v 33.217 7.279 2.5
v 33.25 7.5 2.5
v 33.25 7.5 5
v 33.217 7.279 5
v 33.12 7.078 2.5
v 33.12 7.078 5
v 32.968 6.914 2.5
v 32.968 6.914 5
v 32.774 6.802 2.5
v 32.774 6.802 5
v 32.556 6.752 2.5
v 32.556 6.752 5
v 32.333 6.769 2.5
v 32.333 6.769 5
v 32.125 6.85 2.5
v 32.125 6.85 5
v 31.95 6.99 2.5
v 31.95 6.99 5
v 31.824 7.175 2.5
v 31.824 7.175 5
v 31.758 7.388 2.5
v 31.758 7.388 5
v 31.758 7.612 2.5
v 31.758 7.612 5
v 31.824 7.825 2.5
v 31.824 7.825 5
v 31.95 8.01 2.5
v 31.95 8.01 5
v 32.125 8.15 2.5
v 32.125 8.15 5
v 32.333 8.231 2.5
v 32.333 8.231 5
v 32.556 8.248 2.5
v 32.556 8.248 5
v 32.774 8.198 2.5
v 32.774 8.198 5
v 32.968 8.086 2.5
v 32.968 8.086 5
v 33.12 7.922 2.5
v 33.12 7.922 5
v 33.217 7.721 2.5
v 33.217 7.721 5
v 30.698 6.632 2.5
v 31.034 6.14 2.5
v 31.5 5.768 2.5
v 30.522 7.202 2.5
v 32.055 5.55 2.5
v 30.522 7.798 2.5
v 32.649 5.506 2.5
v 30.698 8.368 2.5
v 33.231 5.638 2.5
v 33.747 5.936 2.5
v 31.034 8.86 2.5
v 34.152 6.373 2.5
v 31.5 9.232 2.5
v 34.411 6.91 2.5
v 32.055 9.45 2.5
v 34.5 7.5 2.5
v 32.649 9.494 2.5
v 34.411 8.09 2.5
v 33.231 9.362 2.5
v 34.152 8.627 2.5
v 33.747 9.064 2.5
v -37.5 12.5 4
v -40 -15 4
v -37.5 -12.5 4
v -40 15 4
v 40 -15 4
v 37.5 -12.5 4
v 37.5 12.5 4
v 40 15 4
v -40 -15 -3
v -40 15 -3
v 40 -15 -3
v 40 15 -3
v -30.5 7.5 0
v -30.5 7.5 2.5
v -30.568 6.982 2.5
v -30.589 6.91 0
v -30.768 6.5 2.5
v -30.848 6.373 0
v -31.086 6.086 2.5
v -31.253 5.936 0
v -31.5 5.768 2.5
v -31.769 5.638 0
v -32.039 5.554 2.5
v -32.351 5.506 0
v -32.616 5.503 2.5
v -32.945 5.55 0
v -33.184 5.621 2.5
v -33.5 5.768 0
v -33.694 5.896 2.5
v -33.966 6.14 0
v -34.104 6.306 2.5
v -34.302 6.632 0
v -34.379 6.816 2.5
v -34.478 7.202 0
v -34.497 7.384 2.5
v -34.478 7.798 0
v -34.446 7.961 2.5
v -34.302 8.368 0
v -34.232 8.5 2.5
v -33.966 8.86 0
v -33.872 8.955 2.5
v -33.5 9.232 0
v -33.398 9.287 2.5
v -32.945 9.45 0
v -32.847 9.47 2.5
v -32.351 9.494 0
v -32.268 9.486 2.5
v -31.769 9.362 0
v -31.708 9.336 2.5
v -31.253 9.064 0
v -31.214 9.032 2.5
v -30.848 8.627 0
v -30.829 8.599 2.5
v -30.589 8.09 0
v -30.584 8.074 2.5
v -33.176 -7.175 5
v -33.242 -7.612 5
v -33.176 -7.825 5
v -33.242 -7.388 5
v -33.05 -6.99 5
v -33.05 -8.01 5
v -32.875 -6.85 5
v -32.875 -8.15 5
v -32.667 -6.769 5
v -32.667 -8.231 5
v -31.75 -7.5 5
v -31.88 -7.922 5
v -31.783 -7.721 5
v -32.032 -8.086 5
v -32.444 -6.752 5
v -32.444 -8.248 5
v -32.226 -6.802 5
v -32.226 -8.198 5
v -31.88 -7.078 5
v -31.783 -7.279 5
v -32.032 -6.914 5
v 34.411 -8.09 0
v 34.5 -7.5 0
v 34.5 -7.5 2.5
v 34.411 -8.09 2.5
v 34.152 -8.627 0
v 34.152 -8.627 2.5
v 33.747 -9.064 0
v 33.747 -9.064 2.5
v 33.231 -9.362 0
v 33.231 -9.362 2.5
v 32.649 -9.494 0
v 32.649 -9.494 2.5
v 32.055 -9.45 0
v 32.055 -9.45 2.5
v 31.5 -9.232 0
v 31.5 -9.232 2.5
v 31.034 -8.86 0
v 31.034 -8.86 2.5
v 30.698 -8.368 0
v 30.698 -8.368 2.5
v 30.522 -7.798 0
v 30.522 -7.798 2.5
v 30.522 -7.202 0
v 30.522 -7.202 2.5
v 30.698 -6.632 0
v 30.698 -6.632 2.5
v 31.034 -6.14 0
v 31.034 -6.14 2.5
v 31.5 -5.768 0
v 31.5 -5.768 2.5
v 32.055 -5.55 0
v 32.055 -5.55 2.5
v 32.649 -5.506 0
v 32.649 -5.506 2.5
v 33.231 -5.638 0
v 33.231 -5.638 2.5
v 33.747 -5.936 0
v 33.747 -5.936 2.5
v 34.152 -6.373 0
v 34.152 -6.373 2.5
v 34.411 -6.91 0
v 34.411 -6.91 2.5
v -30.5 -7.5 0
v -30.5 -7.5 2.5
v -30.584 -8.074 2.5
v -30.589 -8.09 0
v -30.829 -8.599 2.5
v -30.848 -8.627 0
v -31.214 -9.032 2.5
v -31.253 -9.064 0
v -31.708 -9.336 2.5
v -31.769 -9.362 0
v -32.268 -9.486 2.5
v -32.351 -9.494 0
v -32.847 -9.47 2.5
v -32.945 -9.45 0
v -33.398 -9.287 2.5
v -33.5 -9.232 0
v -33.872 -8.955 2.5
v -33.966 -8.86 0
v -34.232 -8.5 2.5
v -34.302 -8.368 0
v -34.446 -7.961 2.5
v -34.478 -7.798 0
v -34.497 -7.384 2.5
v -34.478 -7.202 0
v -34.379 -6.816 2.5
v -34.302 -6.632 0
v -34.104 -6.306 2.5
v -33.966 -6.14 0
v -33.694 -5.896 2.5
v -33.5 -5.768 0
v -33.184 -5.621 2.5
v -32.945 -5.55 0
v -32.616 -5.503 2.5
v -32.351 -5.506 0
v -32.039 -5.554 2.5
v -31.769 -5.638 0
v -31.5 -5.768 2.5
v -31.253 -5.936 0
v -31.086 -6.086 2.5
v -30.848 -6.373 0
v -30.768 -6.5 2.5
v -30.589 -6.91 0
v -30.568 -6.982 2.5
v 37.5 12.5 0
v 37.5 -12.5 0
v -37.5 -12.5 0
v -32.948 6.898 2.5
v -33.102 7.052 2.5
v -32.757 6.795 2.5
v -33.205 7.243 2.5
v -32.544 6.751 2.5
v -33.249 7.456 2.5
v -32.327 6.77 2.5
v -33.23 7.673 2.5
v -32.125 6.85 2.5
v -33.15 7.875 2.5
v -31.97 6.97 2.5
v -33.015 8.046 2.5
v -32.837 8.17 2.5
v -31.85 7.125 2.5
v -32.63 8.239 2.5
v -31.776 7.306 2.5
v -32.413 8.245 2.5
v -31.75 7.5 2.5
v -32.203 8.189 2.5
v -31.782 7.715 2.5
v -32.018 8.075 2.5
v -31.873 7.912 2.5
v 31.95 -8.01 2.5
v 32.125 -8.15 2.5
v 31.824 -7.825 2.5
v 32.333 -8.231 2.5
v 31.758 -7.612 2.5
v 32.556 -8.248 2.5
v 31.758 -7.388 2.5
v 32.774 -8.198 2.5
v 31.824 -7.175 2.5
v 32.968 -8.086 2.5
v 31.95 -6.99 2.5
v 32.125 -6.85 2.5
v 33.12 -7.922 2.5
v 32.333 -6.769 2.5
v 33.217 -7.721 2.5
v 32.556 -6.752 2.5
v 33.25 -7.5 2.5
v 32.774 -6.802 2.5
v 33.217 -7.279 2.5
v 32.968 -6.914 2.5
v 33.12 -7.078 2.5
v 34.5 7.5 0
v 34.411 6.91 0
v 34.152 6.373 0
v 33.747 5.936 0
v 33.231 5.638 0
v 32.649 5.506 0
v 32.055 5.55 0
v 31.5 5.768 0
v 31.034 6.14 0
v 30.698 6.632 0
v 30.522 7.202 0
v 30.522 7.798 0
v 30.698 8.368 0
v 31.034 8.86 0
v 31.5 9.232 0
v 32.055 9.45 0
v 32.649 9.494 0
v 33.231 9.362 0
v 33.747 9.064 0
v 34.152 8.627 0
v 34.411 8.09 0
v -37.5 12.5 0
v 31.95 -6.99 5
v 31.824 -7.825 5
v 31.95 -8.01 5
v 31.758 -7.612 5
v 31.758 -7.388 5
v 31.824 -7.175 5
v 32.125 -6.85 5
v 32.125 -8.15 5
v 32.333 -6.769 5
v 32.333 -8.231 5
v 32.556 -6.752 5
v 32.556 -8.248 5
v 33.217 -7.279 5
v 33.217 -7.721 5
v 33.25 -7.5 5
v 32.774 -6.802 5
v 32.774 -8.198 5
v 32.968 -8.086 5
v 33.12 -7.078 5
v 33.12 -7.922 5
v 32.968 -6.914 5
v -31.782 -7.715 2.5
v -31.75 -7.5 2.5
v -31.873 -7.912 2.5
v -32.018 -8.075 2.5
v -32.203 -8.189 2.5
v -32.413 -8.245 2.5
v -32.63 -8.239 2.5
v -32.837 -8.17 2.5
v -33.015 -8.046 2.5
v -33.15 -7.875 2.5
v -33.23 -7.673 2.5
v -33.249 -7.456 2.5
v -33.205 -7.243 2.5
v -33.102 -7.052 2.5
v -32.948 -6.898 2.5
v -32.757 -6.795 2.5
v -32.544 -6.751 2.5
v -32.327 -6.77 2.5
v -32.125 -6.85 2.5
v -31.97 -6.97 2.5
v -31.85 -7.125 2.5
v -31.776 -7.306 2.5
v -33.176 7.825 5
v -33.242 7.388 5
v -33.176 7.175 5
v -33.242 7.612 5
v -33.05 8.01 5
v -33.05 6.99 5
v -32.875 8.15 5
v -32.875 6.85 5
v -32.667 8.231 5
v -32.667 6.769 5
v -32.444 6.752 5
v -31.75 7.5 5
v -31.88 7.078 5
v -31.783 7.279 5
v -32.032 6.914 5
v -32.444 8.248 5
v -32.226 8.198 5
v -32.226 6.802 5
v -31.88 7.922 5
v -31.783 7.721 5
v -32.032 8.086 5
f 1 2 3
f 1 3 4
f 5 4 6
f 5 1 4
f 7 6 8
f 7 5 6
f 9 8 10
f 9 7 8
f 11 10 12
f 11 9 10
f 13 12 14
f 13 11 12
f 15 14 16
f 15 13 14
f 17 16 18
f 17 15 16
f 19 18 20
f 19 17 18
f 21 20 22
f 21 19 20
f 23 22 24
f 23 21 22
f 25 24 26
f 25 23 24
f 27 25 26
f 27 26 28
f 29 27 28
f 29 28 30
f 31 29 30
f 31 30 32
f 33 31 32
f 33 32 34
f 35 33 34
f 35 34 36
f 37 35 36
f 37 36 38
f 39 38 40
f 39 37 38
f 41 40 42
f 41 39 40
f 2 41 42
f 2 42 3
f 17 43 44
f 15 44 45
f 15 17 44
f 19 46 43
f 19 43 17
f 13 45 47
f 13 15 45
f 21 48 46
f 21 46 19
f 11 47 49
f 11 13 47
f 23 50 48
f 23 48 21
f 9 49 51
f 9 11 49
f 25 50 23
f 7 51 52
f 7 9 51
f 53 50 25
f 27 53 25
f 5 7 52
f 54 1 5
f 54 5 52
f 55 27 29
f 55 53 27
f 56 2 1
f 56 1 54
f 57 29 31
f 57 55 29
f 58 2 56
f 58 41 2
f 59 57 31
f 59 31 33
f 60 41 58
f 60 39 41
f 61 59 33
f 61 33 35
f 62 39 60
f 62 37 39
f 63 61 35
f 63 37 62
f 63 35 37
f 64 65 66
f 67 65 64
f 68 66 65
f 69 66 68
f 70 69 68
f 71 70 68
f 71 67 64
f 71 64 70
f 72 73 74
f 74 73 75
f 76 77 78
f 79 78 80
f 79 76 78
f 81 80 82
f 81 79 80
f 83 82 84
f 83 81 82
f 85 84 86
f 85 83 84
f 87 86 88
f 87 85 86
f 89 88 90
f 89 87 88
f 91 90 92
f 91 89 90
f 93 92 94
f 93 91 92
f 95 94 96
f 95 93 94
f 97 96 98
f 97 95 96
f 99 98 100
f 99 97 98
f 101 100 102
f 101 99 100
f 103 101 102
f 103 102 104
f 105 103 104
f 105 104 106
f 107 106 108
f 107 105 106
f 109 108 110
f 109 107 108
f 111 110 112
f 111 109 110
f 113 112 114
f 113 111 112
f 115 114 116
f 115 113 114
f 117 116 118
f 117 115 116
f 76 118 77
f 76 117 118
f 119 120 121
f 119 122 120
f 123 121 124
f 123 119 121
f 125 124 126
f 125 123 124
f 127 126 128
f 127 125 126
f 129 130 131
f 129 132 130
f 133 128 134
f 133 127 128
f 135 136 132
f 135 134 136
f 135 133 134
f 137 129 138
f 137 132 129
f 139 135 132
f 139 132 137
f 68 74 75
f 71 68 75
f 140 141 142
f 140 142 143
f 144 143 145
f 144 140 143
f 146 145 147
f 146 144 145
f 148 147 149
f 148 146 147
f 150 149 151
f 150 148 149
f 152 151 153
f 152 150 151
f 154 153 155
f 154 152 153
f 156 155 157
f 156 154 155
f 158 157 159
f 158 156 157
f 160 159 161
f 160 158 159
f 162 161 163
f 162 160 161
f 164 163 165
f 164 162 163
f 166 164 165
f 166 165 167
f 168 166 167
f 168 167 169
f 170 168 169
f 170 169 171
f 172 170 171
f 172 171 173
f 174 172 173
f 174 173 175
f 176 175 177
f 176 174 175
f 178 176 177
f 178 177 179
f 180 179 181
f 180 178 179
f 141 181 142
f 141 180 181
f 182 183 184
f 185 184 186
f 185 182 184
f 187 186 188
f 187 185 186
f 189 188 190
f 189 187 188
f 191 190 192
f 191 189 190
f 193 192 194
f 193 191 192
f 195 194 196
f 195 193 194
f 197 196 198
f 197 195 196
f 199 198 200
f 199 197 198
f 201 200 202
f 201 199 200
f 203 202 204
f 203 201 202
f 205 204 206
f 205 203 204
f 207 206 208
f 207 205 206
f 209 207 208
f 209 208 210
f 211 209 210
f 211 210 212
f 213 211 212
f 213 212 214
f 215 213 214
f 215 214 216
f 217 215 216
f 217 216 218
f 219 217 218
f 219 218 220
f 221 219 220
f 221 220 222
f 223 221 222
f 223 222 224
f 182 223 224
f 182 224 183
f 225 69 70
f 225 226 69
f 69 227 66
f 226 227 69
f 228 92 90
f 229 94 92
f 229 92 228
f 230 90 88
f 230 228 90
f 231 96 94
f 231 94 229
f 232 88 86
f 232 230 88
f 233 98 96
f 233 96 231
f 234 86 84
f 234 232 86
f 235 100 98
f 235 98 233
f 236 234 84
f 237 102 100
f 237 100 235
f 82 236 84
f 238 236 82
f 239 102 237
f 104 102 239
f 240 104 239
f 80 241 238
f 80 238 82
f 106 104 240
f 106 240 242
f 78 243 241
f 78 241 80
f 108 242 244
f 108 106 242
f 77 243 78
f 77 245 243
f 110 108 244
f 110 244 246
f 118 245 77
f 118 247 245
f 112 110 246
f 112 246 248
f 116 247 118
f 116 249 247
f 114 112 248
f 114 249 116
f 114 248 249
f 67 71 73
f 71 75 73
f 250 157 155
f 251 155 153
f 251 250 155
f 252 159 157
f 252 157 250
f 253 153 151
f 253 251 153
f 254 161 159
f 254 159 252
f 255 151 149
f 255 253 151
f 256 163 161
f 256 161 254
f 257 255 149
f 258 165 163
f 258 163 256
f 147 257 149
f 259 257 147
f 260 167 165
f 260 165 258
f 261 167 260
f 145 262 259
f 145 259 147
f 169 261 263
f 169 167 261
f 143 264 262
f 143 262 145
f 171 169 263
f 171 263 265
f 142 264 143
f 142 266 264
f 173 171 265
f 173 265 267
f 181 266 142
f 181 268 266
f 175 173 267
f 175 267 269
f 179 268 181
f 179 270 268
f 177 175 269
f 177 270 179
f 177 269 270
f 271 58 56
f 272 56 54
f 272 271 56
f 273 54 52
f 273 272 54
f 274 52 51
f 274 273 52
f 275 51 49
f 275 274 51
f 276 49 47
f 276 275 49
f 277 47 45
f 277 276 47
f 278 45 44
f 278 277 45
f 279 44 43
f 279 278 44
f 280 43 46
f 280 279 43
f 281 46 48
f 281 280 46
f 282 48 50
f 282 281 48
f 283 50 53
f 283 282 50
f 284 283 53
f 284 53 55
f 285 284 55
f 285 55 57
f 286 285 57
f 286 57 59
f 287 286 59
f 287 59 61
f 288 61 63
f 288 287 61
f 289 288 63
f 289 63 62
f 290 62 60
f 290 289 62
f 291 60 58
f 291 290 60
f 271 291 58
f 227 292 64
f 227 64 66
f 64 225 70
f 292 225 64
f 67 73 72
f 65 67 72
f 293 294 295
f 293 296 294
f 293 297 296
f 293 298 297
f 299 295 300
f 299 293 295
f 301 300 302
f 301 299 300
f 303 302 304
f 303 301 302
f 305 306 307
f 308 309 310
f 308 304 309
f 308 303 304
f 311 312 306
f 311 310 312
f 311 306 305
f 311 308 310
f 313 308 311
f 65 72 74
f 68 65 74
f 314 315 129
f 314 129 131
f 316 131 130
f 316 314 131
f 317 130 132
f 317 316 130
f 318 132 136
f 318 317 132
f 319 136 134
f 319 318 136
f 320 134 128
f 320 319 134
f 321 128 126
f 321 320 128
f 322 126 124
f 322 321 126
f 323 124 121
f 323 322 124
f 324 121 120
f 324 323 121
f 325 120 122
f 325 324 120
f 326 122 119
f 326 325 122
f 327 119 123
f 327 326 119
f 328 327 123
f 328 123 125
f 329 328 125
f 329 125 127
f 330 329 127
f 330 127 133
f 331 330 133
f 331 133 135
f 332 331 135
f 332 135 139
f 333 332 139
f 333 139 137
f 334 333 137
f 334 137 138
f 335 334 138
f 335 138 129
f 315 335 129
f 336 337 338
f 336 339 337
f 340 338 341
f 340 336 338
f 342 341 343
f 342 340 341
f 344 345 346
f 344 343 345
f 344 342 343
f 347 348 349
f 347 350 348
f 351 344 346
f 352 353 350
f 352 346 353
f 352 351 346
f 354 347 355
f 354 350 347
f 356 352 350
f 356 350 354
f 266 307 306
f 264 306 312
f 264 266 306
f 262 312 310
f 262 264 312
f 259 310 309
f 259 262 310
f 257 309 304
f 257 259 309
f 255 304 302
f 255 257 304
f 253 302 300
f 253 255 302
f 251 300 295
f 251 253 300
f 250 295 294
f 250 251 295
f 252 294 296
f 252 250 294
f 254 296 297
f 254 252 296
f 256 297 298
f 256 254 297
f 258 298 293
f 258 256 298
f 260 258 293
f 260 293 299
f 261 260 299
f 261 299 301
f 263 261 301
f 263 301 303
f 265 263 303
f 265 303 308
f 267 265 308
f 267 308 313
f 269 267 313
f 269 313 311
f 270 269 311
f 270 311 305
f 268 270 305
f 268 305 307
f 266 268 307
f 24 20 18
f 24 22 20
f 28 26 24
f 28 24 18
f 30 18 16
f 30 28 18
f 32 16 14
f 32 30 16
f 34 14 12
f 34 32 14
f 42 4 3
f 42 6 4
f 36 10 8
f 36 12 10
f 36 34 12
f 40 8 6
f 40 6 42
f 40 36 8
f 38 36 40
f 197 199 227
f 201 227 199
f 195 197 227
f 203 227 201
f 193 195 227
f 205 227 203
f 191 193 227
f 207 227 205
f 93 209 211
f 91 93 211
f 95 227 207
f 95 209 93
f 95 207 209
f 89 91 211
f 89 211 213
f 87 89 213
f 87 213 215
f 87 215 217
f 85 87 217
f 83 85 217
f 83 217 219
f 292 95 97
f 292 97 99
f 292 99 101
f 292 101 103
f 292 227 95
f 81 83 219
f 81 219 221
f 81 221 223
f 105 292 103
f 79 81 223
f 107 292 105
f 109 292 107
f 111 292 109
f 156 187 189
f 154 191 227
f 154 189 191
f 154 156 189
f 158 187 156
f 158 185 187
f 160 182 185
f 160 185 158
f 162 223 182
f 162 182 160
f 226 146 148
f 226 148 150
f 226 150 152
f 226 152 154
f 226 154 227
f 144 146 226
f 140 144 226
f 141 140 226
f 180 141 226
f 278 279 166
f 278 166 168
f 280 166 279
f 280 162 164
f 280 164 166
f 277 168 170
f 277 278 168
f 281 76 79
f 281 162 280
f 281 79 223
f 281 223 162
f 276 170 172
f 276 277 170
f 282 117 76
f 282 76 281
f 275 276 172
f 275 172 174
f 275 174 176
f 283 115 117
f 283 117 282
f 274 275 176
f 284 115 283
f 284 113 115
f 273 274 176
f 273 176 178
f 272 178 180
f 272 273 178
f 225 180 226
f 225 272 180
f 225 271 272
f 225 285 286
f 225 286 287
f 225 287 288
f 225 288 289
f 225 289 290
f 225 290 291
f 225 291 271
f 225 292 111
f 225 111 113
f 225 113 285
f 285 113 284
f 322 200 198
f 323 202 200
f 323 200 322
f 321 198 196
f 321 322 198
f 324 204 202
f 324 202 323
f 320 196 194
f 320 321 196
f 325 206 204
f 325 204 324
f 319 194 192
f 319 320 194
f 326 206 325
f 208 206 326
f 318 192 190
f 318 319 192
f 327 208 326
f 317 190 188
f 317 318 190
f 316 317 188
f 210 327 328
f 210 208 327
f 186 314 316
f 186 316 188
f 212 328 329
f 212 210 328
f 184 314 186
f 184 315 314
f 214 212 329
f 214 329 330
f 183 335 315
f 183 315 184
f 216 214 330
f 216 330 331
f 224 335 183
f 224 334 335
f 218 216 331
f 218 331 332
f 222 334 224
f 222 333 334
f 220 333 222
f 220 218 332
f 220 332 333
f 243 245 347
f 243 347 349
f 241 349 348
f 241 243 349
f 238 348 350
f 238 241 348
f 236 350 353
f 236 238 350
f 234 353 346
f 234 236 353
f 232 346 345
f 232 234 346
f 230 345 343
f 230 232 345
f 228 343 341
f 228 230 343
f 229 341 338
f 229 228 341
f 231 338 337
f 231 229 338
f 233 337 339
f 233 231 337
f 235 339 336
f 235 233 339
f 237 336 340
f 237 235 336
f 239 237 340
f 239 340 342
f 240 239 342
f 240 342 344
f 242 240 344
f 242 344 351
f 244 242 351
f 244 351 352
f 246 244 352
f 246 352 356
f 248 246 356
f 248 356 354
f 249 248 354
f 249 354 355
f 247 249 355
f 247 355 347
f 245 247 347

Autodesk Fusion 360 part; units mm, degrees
sketch "Sketch1" plane through (0, 0, 0) normal (0, 0, 1) x (1, 0, 0)
  line L0 (37.5, 12.5) -> (-37.5, 12.5)
  line L1 (-37.5, 12.5) -> (-37.5, -12.5)
  line L2 (-37.5, -12.5) -> (37.5, -12.5)
  line L3 (37.5, -12.5) -> (37.5, 12.5)
  line L4 (37.5, 12.5) -> (-37.5, -12.5) construction
  line L5 (-37.5, 12.5) -> (37.5, -12.5) construction
  line L6 (-40, -15) -> (40, -15)
  line L7 (40, -15) -> (40, 15)
  line L8 (40, 15) -> (-40, 15)
  line L9 (-40, 15) -> (-40, -15)
  line L10 (-34.5, -9.5) -> (34.5, -9.5)
  line L11 (34.5, -9.5) -> (34.5, 9.5)
  line L12 (34.5, 9.5) -> (-34.5, 9.5)
  line L13 (-34.5, 9.5) -> (-34.5, -9.5)
  line L14 (0, 15) -> (0, -15)
  circle A0 centre (-32.5, 7.5) radius 0.75
  circle A1 centre (-32.5, 7.5) radius 2
  circle A2 centre (-32.5, -7.5) radius 2
  circle A3 centre (-32.5, -7.5) radius 0.75
  circle A4 centre (32.5, -7.5) radius 0.75
  circle A5 centre (32.5, -7.5) radius 2
  circle A6 centre (32.5, 7.5) radius 0.75
  circle A7 centre (32.5, 7.5) radius 2
  line L15 (-32.5, 7.5) -> (-28.1699, 0)
  line L16 (-28.1699, 0) -> (-32.5, -7.5)
  line L17 (32.5, -7.5) -> (28.1699, 0)
  line L18 (28.1699, 0) -> (32.5, 7.5)
  dimension "d1" = 75
  dimension "d2" = 25
  dimension "d3" = 2.5
  dimension "d4" = -3
  dimension "d5" = 1.5
  dimension "d6" = 4
  dimension "d7" = 4
  dimension "d8" = 1.5
  dimension "d9" = 1.5
  dimension "d10" = 4
  dimension "d11" = 1.5
  dimension "d12" = 4
  dimension "d16" = 30
  dimension "d17" = 30
  dimension "d18" = 30
  dimension "d19" = 30
extrude "Extrude1" add sketch "Sketch1" against normal blind 3 contours L0 L2 L3 L10 L11 L12 L14 | L0 L2 L3 L6 L7 L8 L14 | L0 L1 L2 L10 L12 L13 L14 | L0 L1 L2 L6 L8 L9 L14 | L10 L12 L14 A1 A2 L15 L16 | L10 L12 L14 A5 A7 L17 L18 | L11 L12 A7 | A6 | A7 | L12 L13 A1 | A0 | A1 | L11 A5 A7 L17 L18 | L13 A1 A2 L15 L16 | L10 L13 A2 | A3 | A2 | L10 L11 A5 | A4 | A5
extrude "Extrude2" add sketch "Sketch1" along normal blind 4 contours L0 L2 L3 L6 L7 L8 L14 | L0 L1 L2 L6 L8 L9 L14
extrude "Extrude3" add sketch "Sketch1" along normal blind 2.5 contours A6 | A7 | A0 | A1 | A3 | A2 | A4 | A5
extrude "Extrude5" add sketch "Sketch1" along normal blind 5 contours A6 | A0 | A3 | A4
